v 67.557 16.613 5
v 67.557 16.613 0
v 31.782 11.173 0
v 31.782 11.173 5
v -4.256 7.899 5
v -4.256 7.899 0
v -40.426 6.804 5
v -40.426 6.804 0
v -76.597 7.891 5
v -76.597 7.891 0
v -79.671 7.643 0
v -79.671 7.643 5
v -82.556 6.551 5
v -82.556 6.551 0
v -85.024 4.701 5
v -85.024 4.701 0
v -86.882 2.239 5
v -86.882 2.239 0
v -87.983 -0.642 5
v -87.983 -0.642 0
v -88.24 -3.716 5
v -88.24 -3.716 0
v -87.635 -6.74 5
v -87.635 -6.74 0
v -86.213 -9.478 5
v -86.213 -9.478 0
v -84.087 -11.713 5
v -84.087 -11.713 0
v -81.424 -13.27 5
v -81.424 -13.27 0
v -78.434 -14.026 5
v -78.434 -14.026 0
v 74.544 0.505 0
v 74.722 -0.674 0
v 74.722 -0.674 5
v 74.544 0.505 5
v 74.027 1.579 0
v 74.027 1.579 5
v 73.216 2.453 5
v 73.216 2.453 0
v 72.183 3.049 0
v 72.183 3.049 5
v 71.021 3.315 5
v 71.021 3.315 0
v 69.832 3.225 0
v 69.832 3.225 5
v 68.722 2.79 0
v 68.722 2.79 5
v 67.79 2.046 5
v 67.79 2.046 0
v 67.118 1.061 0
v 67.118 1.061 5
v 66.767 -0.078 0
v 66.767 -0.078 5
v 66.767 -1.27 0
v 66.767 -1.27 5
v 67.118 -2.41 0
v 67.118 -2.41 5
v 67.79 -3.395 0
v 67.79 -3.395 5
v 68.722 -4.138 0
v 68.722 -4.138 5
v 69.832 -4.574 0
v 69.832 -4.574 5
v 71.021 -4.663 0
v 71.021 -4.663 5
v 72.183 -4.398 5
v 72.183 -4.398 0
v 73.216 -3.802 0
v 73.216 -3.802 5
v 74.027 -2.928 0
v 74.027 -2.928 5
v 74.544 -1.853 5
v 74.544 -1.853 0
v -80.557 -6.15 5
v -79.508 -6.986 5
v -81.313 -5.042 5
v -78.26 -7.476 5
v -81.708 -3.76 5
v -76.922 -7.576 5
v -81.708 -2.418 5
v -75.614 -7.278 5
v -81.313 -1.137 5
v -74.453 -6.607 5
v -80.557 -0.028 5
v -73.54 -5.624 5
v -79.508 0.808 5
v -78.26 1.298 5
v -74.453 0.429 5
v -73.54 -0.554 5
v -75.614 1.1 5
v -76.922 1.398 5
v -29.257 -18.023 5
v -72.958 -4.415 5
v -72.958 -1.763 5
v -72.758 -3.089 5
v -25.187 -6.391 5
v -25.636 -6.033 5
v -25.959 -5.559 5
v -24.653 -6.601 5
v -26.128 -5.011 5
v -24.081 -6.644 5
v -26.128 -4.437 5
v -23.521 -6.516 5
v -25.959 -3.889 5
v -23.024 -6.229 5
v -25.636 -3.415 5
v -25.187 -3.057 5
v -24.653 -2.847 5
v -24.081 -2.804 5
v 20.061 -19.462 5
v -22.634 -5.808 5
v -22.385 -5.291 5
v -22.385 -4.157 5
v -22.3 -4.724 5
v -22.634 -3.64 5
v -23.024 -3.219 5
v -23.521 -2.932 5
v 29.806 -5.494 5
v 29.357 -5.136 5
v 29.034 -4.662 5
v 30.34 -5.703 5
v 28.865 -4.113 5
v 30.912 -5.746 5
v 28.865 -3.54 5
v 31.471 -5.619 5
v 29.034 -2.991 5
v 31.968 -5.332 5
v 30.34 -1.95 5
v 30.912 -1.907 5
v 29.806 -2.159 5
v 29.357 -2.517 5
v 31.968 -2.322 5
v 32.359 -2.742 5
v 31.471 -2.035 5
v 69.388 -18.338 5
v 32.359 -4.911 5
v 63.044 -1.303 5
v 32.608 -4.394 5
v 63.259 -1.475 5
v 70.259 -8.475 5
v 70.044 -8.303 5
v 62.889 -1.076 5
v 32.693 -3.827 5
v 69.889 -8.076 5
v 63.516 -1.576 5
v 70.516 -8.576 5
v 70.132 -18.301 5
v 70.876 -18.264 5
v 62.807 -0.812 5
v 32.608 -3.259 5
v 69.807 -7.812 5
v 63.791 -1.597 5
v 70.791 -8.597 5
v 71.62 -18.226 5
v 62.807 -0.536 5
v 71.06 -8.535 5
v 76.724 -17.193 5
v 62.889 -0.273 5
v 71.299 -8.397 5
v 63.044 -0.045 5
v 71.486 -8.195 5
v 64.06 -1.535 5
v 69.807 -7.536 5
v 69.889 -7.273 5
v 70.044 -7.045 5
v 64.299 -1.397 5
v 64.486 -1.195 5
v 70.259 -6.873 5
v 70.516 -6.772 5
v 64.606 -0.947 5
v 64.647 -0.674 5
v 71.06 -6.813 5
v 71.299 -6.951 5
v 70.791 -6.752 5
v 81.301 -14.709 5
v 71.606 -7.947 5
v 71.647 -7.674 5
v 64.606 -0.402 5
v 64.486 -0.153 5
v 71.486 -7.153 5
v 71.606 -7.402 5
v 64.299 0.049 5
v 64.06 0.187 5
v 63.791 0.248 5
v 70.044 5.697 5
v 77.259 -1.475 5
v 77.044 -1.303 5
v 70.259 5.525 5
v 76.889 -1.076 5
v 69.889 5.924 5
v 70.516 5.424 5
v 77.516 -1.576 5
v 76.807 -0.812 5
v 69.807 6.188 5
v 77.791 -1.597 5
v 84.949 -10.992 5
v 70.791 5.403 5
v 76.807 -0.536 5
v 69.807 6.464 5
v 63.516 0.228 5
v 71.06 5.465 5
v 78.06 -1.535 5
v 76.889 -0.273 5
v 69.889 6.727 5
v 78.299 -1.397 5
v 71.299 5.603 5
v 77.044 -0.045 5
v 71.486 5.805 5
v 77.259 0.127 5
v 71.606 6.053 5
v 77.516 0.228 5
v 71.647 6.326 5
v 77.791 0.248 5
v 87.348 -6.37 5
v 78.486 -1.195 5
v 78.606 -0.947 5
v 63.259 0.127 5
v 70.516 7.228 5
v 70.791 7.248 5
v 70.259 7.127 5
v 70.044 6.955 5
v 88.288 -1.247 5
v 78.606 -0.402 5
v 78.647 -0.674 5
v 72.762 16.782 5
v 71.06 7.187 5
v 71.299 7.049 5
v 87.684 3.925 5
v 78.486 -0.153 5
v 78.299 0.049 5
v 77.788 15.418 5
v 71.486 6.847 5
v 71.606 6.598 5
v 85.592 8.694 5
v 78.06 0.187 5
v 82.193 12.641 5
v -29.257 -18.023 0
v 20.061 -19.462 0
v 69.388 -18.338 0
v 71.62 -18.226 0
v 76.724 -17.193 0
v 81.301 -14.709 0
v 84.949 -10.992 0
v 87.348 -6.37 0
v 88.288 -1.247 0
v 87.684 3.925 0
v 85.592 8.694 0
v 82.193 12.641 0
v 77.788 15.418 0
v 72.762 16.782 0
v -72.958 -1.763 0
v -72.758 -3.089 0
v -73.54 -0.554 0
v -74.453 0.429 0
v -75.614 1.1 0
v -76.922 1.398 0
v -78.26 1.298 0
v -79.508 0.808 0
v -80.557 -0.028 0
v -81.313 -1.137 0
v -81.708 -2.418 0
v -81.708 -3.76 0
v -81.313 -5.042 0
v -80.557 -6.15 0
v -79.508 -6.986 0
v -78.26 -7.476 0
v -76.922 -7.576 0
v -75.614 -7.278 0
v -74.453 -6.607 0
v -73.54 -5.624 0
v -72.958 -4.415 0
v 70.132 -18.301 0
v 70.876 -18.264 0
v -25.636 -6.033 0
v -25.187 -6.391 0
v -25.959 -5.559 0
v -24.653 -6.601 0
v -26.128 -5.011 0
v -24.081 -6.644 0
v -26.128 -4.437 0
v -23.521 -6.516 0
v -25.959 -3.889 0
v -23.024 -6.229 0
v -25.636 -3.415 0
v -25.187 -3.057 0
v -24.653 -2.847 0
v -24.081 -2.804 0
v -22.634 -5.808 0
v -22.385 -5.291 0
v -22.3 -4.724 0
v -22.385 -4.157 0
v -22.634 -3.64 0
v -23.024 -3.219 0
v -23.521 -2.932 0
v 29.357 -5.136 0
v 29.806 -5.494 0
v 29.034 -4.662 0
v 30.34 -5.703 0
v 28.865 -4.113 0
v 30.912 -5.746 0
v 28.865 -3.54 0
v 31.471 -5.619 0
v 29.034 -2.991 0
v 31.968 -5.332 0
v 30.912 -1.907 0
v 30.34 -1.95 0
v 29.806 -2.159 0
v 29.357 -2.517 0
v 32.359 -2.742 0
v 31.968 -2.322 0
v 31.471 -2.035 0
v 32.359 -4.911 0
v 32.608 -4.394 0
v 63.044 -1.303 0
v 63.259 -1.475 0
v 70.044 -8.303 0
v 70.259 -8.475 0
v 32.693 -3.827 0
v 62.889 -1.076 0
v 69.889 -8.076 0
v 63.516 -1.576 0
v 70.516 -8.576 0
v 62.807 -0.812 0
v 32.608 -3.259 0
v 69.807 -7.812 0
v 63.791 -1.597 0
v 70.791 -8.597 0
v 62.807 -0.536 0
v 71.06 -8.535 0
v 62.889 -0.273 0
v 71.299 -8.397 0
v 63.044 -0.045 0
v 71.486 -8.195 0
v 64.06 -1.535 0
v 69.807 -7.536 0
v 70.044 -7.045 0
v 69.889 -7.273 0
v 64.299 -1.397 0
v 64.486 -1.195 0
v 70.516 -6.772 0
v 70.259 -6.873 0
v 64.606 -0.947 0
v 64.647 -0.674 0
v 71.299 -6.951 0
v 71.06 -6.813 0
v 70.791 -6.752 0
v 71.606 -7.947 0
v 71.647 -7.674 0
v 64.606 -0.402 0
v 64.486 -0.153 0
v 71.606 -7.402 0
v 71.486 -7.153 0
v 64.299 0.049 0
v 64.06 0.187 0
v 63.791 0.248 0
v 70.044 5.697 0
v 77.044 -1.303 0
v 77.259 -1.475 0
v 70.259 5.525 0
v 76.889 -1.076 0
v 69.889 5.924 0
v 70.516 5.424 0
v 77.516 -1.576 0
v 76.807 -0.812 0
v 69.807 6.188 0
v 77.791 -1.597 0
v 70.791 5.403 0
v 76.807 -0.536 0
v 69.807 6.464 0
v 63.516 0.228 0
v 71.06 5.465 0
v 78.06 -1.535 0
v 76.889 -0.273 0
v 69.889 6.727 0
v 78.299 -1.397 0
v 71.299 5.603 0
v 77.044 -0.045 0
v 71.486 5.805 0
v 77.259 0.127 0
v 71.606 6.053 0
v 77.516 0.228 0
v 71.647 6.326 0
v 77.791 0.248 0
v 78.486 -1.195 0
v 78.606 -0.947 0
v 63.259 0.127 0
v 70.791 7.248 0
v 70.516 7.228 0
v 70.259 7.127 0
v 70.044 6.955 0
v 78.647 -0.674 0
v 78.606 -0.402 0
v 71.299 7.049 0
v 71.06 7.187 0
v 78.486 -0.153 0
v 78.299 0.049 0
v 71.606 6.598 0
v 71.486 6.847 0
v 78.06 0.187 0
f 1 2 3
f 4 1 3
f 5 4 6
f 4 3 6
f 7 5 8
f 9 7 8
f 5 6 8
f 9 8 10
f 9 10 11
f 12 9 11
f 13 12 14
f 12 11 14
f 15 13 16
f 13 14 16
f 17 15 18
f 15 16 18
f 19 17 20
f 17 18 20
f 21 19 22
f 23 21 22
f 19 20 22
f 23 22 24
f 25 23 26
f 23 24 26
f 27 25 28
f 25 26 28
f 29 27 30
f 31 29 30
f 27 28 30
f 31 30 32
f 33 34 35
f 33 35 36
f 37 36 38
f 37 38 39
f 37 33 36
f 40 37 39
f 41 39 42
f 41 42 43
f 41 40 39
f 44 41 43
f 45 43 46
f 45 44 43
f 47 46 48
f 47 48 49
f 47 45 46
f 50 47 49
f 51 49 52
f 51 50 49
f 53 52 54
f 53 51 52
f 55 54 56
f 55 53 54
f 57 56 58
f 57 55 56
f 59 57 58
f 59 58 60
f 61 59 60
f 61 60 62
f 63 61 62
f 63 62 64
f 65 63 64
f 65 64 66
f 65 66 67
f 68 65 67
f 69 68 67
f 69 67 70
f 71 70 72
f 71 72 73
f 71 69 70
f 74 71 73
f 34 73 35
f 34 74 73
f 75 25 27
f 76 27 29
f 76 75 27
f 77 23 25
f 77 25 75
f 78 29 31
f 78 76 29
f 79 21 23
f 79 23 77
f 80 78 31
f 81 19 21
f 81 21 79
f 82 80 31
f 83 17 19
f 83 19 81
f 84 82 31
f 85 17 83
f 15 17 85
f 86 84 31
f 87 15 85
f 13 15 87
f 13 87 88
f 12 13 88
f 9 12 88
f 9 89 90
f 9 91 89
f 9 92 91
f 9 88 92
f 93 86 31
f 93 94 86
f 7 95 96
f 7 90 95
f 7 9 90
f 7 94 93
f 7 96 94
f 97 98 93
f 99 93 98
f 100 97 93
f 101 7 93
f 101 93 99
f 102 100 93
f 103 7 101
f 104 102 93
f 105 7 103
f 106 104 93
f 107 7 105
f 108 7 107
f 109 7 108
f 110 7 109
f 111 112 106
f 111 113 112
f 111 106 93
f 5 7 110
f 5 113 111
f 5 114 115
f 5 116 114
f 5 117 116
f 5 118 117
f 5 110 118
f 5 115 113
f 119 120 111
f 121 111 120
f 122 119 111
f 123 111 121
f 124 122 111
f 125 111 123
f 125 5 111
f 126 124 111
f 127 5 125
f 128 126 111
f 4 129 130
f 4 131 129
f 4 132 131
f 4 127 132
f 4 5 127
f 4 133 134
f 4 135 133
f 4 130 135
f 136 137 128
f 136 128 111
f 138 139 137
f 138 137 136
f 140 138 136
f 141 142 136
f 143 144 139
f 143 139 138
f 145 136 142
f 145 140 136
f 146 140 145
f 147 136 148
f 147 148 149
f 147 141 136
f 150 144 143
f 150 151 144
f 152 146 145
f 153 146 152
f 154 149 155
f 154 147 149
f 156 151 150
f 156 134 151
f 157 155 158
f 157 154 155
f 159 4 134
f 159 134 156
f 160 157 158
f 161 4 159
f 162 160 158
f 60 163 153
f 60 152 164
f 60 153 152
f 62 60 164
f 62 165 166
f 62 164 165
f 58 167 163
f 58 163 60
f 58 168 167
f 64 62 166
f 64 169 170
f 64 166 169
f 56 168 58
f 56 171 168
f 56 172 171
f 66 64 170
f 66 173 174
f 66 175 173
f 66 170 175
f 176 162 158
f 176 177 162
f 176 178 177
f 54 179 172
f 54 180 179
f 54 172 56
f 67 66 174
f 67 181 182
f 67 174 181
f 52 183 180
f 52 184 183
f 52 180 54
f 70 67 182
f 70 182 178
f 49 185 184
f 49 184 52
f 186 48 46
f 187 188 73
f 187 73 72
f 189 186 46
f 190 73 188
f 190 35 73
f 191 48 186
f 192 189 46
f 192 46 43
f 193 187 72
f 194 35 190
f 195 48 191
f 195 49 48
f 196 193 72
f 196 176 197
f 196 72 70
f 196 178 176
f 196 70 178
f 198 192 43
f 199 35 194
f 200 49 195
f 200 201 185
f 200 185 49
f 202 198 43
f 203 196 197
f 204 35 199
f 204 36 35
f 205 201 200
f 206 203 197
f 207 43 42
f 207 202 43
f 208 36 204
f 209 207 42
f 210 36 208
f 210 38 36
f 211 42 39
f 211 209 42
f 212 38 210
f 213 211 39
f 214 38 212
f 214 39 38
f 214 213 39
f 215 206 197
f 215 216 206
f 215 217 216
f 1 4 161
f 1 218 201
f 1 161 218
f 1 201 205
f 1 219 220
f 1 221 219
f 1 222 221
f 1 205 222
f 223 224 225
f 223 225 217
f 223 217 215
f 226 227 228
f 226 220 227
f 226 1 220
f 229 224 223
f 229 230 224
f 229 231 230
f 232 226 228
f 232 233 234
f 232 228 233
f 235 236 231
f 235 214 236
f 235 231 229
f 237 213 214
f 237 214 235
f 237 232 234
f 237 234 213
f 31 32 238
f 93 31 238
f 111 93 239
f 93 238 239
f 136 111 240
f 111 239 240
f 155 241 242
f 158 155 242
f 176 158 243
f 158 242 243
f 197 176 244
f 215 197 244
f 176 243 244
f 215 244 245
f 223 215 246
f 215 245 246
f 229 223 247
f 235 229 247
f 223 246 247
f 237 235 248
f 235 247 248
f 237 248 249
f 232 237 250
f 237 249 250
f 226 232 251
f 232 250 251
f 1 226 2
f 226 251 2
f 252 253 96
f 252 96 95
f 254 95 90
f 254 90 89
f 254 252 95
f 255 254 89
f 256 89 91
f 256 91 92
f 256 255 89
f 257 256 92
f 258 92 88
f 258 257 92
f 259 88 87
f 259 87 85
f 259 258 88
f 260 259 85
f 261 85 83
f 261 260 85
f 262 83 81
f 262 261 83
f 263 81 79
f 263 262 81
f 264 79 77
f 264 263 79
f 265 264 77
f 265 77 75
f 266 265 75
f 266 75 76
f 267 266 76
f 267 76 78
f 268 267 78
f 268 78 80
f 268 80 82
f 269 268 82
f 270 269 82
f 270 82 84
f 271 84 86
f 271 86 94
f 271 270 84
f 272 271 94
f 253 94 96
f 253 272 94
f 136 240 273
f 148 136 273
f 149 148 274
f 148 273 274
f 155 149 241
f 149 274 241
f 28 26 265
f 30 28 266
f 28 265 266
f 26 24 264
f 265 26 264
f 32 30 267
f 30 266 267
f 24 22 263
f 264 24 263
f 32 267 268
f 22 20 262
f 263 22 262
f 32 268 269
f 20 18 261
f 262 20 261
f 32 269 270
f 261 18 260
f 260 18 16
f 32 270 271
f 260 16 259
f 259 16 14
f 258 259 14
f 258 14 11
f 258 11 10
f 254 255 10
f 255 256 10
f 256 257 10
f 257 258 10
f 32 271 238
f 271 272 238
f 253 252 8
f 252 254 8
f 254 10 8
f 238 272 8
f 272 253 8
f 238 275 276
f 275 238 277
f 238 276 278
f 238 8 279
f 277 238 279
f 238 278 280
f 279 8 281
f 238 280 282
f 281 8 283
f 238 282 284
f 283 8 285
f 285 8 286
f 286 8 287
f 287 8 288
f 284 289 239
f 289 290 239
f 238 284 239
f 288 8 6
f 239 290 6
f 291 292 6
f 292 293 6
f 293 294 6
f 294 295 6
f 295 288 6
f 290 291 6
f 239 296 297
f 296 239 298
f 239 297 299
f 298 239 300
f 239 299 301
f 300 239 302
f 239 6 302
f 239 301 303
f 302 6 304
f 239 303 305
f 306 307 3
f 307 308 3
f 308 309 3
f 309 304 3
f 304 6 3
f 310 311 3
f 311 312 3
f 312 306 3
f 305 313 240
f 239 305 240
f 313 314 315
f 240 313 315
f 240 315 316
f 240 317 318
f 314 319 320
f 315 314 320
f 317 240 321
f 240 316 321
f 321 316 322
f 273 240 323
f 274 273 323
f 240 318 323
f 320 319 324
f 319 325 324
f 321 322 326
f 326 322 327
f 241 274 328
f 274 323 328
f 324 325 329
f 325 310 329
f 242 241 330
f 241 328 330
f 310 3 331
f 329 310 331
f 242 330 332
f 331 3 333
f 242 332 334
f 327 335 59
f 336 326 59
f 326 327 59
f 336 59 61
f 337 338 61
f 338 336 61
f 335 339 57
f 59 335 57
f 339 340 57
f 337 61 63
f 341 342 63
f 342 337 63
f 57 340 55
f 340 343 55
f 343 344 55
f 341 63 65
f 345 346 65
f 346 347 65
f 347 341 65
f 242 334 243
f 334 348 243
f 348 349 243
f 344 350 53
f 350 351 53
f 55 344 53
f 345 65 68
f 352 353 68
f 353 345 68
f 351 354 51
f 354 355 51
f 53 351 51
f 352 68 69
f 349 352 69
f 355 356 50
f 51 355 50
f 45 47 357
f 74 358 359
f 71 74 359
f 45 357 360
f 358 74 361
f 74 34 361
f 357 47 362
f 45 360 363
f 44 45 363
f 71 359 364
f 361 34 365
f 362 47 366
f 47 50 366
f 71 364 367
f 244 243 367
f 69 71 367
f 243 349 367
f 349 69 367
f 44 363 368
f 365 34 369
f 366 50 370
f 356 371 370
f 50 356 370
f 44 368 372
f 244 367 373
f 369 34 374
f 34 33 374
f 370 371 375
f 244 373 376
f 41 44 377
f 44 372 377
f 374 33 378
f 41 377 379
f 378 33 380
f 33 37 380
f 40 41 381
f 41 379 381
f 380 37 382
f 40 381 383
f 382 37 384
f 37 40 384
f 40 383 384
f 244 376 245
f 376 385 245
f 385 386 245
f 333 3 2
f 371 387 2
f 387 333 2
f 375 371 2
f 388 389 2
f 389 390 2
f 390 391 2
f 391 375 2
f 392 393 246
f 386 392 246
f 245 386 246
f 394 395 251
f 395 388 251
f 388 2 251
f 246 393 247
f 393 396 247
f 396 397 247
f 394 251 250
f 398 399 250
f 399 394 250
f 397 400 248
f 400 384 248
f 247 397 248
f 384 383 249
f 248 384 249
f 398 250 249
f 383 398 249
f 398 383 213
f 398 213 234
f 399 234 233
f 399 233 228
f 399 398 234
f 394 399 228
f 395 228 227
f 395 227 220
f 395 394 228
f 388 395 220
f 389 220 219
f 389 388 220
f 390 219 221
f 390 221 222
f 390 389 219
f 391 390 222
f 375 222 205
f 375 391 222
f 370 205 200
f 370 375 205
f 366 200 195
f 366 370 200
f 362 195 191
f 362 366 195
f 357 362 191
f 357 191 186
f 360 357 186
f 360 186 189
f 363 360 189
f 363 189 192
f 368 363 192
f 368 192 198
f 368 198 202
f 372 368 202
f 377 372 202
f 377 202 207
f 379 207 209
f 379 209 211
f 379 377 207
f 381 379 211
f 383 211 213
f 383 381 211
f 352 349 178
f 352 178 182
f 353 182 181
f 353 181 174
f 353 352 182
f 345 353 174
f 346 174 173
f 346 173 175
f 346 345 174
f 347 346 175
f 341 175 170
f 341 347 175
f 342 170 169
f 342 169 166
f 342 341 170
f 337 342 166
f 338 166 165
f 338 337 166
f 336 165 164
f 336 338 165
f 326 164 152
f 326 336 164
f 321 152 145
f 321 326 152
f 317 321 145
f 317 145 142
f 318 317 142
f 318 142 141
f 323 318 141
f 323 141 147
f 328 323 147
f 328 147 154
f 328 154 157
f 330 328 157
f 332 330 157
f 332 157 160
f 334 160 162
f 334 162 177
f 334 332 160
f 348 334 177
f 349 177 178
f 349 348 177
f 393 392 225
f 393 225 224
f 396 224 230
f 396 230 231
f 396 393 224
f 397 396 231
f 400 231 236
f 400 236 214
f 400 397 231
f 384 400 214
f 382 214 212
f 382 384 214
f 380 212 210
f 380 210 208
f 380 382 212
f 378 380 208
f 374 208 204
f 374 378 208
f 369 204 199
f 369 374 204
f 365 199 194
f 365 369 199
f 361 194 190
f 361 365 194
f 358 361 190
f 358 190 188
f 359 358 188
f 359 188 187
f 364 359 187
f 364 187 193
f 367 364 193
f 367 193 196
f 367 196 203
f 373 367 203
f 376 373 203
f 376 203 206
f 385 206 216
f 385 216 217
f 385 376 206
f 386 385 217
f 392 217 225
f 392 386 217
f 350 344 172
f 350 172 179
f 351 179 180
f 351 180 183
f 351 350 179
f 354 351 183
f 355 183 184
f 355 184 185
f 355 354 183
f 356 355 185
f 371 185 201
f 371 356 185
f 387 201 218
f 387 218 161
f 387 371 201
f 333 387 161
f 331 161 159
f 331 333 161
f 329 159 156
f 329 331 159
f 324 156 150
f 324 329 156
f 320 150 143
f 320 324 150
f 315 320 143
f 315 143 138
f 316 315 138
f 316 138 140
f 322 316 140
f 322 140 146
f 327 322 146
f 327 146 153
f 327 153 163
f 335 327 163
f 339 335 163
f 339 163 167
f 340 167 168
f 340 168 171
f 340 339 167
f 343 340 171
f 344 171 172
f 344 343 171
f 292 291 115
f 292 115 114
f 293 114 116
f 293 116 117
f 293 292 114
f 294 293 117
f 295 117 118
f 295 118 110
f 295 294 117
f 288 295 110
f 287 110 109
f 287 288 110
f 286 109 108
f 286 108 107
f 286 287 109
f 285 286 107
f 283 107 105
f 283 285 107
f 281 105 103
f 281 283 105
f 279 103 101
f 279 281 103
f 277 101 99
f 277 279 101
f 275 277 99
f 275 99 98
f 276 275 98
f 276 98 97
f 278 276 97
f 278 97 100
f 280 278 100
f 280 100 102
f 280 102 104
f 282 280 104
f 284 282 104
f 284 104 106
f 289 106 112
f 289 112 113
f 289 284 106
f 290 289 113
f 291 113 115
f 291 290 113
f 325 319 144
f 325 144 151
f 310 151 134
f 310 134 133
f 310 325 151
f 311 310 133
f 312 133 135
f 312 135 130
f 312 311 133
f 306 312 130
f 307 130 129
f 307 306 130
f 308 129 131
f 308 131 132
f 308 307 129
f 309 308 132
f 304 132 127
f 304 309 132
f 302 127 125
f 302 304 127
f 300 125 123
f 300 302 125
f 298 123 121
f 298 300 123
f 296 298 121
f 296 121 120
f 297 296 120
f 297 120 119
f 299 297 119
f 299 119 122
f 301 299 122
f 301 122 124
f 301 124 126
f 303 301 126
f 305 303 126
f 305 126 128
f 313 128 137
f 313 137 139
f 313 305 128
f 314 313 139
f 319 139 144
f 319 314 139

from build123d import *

# Parameters (mm, degrees)
ESQUISSE1_R        = 1.925
ESQUISSE1_R_2      = 0.925
ESQUISSE1_R_3      = 4
ESQUISSE1_R_4      = 4.5
BOSS_EXTRU_1_DEPTH = 5


with BuildPart() as part:
    # Esquisse1 → Boss.-Extru.1 (new body)
    with BuildSketch(Plane.XY):
        with BuildLine():
            ThreePointArc((-76.596505759, 7.891023923), (-88.219919815, -2.170080062), (-78.433932641, -14.026049982))
            ThreePointArc((-78.433932641, -14.026049982), (-4.607074536, -19.062713423), (69.387841086, -18.337855841))
            ThreePointArc((69.387841086, -18.337855841), (70.503800614, -18.28274944), (71.619694559, -18.226330568))
            ThreePointArc((71.619694559, -18.226330568), (88.178632292, 1.361410834), (67.556915532, 16.613388736))
            ThreePointArc((67.556915532, 16.613388736), (-4.256409128, 7.899259424), (-76.596505759, 7.891023923))
        make_face()
        with Locations((30.768040312, -3.82658336)):
            Circle(ESQUISSE1_R, mode=Mode.SUBTRACT)
        with Locations((-24.224638361, -4.723964207)):
            Circle(ESQUISSE1_R, mode=Mode.SUBTRACT)
        with Locations((77.721925672, -0.674275531)):
            Circle(ESQUISSE1_R_2, mode=Mode.SUBTRACT)
        with Locations((70.721925672, -7.674275531)):
            Circle(ESQUISSE1_R_2, mode=Mode.SUBTRACT)
        with Locations((63.721925672, -0.674275531)):
            Circle(ESQUISSE1_R_2, mode=Mode.SUBTRACT)
        with Locations((70.721925672, 6.325724469)):
            Circle(ESQUISSE1_R_2, mode=Mode.SUBTRACT)
        with Locations((70.721925672, -0.674275531)):
            Circle(ESQUISSE1_R_3, mode=Mode.SUBTRACT)
        with Locations((-77.258373302, -3.089045811)):
            Circle(ESQUISSE1_R_4, mode=Mode.SUBTRACT)
    extrude(amount=BOSS_EXTRU_1_DEPTH)


solid = part.part
